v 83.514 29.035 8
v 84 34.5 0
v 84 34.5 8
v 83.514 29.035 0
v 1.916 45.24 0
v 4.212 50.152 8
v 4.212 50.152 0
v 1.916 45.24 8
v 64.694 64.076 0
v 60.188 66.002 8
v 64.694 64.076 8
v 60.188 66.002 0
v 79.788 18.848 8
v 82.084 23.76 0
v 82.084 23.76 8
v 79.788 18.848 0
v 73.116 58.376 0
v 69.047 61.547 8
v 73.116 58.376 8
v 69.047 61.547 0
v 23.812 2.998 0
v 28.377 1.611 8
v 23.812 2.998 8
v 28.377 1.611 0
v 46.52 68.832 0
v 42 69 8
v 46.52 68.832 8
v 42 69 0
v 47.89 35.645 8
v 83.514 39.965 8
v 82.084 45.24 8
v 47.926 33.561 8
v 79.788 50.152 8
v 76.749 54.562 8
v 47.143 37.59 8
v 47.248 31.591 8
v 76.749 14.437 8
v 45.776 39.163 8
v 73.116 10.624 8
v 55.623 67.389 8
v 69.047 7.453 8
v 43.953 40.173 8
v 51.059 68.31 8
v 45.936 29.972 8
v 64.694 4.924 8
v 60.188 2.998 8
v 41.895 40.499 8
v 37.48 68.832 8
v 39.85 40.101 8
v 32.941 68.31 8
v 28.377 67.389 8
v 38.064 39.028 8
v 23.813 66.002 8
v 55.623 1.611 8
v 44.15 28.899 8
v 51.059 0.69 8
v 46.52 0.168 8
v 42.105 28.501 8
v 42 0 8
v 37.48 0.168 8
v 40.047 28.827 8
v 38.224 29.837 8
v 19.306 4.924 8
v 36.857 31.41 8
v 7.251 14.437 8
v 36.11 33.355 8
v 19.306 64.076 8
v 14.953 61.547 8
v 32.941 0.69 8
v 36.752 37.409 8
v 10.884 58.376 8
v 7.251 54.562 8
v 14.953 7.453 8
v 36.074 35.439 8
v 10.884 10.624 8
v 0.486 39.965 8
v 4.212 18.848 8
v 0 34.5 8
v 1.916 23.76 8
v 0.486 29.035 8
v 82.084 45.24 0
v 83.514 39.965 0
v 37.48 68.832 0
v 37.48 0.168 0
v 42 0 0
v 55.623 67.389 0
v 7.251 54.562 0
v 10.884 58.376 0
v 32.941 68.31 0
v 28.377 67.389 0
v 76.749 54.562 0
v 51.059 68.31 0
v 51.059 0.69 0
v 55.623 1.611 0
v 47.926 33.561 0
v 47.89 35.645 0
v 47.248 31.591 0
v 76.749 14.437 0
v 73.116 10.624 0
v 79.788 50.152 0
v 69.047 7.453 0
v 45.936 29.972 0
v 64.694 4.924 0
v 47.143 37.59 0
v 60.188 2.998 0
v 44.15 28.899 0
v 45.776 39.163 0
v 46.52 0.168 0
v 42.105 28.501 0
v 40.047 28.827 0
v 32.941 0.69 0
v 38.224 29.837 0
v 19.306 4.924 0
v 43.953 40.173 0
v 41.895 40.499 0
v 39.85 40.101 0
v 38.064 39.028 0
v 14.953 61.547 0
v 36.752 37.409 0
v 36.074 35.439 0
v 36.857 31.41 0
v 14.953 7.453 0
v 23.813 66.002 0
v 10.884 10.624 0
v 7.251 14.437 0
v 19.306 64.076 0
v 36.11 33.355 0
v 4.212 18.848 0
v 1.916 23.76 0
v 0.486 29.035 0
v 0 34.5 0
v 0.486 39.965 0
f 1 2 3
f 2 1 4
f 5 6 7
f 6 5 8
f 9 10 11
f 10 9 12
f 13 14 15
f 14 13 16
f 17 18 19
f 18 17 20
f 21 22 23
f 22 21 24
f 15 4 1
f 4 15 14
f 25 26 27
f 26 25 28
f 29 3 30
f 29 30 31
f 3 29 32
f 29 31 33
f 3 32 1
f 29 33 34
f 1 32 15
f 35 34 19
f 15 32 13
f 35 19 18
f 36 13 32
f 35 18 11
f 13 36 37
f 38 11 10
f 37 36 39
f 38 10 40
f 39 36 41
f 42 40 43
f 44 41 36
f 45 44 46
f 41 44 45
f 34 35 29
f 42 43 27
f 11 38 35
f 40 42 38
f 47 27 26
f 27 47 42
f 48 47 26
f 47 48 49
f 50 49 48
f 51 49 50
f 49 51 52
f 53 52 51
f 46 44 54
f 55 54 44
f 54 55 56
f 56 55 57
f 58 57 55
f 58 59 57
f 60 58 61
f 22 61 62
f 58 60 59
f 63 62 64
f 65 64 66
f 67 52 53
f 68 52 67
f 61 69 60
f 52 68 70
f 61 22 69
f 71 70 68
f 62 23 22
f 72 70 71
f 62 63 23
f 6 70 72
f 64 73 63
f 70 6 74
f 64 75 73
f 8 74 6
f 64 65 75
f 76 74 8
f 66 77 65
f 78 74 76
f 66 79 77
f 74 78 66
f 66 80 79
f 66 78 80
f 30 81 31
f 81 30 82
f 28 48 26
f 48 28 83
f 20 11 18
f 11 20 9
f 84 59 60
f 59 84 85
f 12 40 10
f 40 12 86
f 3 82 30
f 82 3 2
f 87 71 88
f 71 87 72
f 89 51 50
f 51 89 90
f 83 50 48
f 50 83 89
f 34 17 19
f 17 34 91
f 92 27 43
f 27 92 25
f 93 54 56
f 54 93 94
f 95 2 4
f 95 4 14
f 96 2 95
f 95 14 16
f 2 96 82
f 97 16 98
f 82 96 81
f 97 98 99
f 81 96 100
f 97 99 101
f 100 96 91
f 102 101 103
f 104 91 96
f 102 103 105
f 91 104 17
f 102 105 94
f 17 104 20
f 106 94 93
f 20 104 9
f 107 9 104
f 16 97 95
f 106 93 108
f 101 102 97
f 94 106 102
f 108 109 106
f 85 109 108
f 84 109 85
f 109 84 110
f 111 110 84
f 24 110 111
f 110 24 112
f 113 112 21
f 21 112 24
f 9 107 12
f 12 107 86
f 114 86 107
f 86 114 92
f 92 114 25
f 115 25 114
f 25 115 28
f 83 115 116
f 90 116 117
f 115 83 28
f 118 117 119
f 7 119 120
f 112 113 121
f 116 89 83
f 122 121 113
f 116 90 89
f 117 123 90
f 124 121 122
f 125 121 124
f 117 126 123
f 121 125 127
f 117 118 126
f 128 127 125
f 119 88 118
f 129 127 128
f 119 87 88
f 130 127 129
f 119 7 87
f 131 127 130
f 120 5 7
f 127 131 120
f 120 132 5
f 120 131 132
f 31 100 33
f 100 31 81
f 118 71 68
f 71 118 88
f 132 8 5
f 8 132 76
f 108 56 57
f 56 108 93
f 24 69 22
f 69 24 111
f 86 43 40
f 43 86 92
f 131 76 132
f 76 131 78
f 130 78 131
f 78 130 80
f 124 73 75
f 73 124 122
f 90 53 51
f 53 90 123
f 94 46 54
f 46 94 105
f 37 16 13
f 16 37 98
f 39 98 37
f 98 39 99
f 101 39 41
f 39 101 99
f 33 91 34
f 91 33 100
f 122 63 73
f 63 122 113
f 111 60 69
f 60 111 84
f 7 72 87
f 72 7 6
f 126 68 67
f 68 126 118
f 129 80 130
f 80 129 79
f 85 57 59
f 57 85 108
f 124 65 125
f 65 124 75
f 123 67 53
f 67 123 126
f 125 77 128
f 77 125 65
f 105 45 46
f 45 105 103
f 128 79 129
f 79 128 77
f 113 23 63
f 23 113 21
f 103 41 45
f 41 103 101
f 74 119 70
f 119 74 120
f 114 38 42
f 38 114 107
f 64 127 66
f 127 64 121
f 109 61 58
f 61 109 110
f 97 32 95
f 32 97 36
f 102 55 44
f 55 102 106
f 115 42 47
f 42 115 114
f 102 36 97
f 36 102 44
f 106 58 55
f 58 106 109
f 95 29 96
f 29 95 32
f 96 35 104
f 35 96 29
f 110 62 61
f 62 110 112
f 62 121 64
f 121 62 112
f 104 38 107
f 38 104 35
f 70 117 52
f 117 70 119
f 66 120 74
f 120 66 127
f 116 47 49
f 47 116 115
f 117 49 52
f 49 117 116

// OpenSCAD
$fn = 32;

// ----------------------------------------------------------------------
// Cam plate: double_lobe cam, base R32
// ----------------------------------------------------------------------

// --- parameters (mm) ---
base_r = 32;              // base circle radius
lobe_h = 10;              // cam lobe rise
bore_r = 6;               // shaft bore radius
plate_t = 8;              // plate thickness, Z (extrusion height)

profile = [[84, 34.5], [83.514, 39.965], [82.084, 45.24], [79.788, 50.152], [76.749, 54.562], [73.116, 58.376], [69.047, 61.547], [64.694, 64.076], [60.188, 66.002], [55.623, 67.389], [51.059, 68.31], [46.52, 68.832], [42, 69], [37.48, 68.832], [32.941, 68.31], [28.377, 67.389], [23.813, 66.002], [19.306, 64.076], [14.953, 61.547], [10.884, 58.376], [7.251, 54.562], [4.212, 50.152], [1.916, 45.24], [0.486, 39.965], [0, 34.5], [0.486, 29.035], [1.916, 23.76], [4.212, 18.848], [7.251, 14.437], [10.884, 10.624], [14.953, 7.453], [19.306, 4.924], [23.812, 2.998], [28.377, 1.611], [32.941, 0.69], [37.48, 0.168], [42, 0], [46.52, 0.168], [51.059, 0.69], [55.623, 1.611], [60.188, 2.998], [64.694, 4.924], [69.047, 7.453], [73.116, 10.624], [76.749, 14.437], [79.788, 18.848], [82.084, 23.76], [83.514, 29.035]];  // primary outline, 48 points, counter clockwise
void_1 = [[47.89, 35.645], [47.143, 37.59], [45.776, 39.163], [43.953, 40.173], [41.895, 40.499], [39.85, 40.101], [38.064, 39.028], [36.752, 37.409], [36.074, 35.439], [36.11, 33.355], [36.857, 31.41], [38.224, 29.837], [40.047, 28.827], [42.105, 28.501], [44.15, 28.899], [45.936, 29.972], [47.248, 31.591], [47.926, 33.561]];  // shaft bore, 18 points

// --- the one profile operation ---
difference() {
  linear_extrude(height = plate_t) polygon(points = profile);
  translate([0, 0, -1])
    linear_extrude(height = plate_t + 2) polygon(points = void_1);
}
